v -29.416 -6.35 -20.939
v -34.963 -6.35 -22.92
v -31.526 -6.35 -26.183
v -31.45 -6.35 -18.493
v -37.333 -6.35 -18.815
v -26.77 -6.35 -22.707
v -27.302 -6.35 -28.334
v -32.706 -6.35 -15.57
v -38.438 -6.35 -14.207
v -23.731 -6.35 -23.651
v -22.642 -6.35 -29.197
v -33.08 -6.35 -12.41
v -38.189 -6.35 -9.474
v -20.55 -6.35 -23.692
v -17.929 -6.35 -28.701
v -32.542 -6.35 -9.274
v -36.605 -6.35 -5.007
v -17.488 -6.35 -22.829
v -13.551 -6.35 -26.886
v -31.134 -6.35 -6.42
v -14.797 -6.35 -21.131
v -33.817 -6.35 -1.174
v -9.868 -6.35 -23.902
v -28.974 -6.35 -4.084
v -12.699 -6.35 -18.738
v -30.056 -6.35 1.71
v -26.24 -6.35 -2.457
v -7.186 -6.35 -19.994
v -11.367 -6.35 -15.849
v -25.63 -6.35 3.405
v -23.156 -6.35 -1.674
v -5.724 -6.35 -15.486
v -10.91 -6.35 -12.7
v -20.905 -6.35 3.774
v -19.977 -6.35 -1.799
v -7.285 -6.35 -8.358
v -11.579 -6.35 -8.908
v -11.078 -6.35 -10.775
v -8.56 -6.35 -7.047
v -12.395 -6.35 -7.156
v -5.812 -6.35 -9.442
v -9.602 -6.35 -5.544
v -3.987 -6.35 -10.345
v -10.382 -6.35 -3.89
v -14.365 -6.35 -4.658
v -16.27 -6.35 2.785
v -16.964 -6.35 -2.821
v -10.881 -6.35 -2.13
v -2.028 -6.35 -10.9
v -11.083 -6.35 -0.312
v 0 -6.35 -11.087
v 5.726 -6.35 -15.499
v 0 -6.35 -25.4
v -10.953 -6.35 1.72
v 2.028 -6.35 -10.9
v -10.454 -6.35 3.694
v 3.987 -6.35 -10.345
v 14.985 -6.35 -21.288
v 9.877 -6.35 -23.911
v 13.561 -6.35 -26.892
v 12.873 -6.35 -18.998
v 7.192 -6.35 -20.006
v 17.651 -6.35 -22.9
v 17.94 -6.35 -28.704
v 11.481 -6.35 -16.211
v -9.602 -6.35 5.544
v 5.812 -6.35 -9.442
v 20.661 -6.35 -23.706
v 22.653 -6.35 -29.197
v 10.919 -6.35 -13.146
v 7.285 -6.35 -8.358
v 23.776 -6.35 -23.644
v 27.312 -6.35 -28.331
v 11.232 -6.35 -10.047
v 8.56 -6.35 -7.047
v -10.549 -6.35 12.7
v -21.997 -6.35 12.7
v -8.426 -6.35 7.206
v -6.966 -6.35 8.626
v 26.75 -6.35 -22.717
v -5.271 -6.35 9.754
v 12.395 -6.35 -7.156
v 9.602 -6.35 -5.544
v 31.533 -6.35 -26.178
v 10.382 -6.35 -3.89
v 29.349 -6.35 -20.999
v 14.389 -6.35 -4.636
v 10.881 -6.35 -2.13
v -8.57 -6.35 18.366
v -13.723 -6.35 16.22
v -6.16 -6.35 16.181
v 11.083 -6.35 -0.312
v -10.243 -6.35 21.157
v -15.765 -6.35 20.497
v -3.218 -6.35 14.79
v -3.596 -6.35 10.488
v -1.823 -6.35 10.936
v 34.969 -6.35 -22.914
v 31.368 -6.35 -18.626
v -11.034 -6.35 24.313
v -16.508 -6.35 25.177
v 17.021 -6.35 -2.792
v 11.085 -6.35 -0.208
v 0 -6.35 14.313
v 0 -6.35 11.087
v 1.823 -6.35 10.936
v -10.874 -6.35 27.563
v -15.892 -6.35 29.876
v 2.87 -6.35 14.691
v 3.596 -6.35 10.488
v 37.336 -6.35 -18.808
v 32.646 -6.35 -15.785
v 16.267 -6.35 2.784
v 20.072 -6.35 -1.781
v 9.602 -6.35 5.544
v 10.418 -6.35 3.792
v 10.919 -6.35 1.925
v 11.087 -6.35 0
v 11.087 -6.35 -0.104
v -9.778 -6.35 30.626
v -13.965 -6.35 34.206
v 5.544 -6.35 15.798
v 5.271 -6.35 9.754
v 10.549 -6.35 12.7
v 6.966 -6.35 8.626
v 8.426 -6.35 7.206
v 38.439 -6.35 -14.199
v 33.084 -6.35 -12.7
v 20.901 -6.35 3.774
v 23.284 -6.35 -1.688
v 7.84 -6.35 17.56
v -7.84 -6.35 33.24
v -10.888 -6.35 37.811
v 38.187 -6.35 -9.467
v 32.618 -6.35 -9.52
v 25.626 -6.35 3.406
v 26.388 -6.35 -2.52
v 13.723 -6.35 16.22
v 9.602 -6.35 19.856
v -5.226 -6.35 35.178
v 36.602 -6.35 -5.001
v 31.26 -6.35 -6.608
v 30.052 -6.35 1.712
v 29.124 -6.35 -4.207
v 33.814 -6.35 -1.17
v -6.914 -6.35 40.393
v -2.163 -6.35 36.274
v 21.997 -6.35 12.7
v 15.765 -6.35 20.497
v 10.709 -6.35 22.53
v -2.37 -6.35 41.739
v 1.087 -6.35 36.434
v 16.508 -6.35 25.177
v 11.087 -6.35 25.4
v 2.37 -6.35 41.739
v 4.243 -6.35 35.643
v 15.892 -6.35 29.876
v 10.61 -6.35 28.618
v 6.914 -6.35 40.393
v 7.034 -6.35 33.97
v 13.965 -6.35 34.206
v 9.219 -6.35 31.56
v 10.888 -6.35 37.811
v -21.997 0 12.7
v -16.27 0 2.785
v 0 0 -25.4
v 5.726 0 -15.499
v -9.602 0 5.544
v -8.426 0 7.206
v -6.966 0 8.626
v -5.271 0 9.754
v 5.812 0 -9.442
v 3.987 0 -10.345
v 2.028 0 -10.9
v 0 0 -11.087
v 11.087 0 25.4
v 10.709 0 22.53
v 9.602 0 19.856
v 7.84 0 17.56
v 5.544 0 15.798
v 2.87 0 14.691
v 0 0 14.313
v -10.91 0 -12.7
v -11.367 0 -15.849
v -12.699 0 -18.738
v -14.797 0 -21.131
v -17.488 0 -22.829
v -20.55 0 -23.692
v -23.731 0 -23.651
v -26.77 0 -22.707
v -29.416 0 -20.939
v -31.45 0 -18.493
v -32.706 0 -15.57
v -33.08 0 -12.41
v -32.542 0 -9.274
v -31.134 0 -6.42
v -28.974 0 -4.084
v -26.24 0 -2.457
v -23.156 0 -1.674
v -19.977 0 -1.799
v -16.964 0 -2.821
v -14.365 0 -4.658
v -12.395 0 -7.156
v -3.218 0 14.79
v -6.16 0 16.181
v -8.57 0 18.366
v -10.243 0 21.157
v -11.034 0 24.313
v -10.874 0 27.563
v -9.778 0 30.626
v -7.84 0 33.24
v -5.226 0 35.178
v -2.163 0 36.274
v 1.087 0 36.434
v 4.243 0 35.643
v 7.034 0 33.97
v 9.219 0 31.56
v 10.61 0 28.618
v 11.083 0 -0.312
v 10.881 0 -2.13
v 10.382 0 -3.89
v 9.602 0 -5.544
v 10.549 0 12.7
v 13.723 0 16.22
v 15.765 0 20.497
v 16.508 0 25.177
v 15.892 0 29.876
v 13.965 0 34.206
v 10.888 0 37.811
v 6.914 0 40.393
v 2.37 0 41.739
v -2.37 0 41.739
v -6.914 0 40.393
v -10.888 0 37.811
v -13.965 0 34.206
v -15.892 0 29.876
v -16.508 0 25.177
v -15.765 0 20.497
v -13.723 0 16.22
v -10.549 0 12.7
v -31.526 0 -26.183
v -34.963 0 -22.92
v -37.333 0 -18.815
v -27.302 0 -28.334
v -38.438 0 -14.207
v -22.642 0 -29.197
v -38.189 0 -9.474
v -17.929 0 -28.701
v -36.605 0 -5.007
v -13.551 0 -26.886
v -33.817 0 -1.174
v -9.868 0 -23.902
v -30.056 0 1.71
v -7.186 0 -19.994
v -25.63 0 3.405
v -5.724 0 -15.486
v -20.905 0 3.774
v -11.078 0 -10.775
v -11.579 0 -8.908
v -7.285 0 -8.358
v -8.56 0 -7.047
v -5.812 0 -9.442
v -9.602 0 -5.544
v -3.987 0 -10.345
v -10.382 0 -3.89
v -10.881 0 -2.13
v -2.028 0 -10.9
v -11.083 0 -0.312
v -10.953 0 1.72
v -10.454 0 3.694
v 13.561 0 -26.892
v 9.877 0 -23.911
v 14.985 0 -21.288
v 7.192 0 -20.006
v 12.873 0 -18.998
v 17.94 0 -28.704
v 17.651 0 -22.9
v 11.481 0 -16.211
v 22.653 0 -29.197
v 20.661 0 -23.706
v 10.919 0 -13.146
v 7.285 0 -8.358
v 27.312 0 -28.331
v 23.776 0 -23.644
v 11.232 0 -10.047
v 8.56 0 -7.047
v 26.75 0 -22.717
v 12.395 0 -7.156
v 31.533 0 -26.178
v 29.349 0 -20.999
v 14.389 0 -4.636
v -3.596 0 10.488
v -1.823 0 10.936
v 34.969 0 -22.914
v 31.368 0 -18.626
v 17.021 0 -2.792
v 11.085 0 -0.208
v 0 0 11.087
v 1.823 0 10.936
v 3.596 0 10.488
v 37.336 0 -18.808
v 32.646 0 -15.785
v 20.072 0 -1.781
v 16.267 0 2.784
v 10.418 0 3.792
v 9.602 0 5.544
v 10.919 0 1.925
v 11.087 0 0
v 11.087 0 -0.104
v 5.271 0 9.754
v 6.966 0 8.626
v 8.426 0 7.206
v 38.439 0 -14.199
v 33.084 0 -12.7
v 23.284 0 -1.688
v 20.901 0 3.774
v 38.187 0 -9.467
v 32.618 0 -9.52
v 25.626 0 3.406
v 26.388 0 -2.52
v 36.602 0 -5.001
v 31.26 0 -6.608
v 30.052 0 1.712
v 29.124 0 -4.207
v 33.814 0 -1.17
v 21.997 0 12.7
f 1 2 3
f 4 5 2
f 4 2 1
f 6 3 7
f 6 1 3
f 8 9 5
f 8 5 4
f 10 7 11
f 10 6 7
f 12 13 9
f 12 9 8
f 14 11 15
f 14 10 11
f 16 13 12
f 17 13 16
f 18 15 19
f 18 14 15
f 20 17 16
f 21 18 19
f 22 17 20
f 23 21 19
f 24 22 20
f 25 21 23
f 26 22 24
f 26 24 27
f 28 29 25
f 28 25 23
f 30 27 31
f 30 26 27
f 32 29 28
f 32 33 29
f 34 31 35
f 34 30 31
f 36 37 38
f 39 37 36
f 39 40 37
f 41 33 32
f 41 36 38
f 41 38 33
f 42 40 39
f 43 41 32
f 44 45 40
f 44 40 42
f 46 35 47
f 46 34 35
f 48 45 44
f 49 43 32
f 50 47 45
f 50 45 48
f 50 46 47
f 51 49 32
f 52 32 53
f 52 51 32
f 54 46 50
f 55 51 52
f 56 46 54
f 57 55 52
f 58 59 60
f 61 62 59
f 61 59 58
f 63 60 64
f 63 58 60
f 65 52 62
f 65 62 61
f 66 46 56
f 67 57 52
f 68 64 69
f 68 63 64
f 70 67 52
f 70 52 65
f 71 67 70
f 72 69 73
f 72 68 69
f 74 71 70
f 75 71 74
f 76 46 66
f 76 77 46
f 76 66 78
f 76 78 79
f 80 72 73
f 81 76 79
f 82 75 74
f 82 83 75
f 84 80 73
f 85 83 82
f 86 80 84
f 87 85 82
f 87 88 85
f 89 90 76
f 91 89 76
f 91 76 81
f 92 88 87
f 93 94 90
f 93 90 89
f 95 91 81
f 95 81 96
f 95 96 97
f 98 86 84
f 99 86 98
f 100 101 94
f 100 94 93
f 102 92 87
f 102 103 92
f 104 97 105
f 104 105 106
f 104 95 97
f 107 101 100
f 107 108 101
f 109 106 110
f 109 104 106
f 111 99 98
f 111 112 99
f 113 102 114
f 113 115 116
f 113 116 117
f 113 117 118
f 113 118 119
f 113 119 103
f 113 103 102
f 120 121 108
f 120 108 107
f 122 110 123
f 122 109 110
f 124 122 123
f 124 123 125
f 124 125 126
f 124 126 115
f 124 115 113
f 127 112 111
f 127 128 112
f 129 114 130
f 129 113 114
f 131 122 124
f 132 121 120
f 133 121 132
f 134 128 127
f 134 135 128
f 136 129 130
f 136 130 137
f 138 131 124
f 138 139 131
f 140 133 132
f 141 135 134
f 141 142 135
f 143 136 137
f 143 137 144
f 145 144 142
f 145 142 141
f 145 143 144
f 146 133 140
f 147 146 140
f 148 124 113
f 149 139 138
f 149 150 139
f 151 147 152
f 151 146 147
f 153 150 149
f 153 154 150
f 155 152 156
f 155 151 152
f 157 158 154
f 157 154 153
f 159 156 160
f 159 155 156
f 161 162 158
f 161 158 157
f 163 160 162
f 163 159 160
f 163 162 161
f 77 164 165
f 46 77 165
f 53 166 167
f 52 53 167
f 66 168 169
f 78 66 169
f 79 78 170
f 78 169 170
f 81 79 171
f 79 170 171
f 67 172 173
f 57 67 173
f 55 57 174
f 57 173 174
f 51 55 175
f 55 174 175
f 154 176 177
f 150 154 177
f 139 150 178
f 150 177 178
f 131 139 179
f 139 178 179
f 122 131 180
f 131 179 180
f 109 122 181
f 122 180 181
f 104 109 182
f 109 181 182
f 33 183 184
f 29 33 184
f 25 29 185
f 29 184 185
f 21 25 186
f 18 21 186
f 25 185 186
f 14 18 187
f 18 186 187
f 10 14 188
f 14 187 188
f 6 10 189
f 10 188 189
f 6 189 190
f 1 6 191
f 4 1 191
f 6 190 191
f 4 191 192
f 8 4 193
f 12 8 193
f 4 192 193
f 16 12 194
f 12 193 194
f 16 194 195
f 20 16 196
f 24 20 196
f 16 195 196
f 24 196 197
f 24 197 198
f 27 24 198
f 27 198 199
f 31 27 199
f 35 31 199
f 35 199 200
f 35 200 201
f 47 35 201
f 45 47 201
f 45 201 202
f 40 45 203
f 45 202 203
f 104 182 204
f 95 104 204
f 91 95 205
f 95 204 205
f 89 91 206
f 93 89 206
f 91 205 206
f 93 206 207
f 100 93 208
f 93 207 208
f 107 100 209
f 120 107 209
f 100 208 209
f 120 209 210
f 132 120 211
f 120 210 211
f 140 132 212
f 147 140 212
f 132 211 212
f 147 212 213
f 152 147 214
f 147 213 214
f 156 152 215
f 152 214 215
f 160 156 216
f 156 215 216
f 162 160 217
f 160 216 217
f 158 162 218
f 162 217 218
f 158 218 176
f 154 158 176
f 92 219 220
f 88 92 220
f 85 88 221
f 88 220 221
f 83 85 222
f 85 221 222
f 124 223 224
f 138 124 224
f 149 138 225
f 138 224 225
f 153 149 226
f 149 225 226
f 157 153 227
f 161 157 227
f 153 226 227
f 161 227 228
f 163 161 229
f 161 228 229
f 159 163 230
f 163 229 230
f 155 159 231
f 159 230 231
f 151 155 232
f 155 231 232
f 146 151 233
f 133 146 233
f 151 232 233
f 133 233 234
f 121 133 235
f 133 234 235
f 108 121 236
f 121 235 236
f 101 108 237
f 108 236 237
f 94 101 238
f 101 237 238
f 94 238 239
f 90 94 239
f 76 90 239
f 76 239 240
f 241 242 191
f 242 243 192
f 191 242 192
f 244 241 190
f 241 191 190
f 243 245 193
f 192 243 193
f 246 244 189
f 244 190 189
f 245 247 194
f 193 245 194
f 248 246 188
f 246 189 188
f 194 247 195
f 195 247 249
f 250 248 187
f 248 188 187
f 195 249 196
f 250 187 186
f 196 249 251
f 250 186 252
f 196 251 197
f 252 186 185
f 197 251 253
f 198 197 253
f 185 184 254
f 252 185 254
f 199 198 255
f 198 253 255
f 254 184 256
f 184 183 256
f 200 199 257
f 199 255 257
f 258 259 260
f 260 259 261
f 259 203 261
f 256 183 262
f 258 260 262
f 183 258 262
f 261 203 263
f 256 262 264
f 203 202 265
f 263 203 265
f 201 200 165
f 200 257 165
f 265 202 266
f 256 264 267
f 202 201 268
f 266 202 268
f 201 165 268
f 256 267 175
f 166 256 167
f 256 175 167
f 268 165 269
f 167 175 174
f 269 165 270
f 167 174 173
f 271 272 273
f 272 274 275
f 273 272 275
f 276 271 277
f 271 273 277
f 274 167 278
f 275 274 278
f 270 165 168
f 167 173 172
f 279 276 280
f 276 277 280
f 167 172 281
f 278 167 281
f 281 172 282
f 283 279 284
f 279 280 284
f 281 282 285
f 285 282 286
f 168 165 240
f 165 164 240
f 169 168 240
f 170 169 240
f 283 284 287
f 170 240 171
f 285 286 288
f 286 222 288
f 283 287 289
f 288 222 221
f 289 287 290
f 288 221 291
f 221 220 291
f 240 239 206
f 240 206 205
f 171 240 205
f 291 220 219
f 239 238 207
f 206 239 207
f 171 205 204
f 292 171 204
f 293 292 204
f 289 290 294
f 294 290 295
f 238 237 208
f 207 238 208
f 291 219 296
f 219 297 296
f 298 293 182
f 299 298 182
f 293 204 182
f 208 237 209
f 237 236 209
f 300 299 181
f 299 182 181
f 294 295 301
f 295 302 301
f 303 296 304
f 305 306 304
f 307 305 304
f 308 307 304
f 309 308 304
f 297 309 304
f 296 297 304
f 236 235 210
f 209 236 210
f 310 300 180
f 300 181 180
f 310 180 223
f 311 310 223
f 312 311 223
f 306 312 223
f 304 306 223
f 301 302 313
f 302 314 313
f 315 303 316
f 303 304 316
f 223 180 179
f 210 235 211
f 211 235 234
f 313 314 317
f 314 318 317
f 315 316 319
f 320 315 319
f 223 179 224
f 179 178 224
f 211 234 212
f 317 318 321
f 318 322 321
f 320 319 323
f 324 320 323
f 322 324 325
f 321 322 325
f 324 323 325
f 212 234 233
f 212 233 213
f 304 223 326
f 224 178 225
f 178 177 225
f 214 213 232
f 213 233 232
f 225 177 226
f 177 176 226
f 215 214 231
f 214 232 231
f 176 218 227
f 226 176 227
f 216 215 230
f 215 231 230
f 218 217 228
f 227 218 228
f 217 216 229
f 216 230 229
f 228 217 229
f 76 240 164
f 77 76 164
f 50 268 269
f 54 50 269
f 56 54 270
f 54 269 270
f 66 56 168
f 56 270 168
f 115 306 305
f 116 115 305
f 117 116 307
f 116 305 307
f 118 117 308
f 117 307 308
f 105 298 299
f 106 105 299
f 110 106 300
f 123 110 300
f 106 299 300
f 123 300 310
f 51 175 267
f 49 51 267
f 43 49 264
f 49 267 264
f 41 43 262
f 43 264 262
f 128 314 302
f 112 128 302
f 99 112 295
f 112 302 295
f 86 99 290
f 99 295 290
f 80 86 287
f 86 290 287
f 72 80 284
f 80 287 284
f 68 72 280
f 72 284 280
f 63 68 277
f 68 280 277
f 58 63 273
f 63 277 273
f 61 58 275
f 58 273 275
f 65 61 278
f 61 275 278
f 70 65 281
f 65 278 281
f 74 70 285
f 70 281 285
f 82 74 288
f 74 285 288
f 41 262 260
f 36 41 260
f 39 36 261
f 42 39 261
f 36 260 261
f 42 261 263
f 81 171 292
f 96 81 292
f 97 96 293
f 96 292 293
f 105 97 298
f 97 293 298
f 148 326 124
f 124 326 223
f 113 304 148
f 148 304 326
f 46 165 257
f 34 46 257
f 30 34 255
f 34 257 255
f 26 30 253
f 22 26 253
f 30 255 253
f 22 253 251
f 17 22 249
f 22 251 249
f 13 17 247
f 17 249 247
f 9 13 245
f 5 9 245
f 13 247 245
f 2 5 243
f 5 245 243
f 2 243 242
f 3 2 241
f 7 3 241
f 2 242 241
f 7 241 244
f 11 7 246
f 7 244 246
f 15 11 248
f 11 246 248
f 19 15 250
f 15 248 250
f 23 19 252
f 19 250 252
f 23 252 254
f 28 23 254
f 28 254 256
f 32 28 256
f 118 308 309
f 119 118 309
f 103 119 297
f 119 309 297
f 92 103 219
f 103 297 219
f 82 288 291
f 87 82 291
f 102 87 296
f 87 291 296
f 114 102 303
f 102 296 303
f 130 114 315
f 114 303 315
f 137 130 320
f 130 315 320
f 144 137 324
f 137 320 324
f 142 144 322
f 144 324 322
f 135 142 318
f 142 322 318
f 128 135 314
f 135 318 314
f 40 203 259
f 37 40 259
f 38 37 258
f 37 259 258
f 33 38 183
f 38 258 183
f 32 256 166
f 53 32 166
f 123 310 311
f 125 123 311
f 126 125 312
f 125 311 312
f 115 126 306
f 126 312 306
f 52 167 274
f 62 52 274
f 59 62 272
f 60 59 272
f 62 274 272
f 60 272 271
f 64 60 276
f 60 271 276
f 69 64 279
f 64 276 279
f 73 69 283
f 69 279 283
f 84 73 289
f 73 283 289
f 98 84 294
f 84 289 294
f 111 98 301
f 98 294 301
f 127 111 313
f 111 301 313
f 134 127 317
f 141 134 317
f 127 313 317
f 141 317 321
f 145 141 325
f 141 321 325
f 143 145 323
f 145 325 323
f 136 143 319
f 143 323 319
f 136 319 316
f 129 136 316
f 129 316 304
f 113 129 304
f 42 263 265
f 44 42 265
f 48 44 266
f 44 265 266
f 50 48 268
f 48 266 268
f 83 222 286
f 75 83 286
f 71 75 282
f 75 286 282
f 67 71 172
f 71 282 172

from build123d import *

# Parameters (mm, degrees)
F1_DEPTH = 6.35


with BuildPart() as f1:
    # F0 (on Front) → F1 (new body)
    with BuildSketch(Plane.XZ):
        with BuildLine():
            ThreePointArc((-5.723816, -15.486059), (-5.488792, -12.459869), (-5.811737, -9.441795))
            ThreePointArc((-5.811737, -9.441795), (-7.949382, -7.728591), (-9.60171, -5.54355))
            ThreePointArc((-9.60171, -5.54355), (-10.667847, -3.020071), (-11.082703, -0.312214))
            ThreePointArc((-11.082703, -0.312214), (-13.533332, 1.47553), (-16.269675, 2.784745))
            ThreePointArc((-16.269675, 2.784745), (-36.296072, -20.953359), (-5.723816, -15.486059))
        make_face()
        with BuildLine():
            ThreePointArc((-10.909945, -12.7), (-32.706361, -15.569553), (-12.395335, -7.15645))
            ThreePointArc((-12.395335, -7.15645), (-11.287729, -9.830447), (-10.909945, -12.7))
        make_face(mode=Mode.SUBTRACT)
        with BuildLine():
            ThreePointArc((16.267047, 2.783773), (13.532129, 1.474812), (11.082703, -0.312214))
            ThreePointArc((11.082703, -0.312214), (10.667847, -3.020071), (9.60171, -5.54355))
            ThreePointArc((9.60171, -5.54355), (7.949382, -7.728591), (5.811737, -9.441795))
            ThreePointArc((5.811737, -9.441795), (5.488694, -12.46668), (5.726121, -15.499486))
            ThreePointArc((5.726121, -15.499486), (36.300176, -20.946245), (16.267047, 2.783773))
        make_face()
        with BuildLine():
            ThreePointArc((33.084145, -12.7), (19.127493, -23.409316), (12.395335, -7.15645))
            ThreePointArc((12.395335, -7.15645), (24.866598, -1.990684), (33.084145, -12.7))
        make_face(mode=Mode.SUBTRACT)
        with BuildLine():
            ThreePointArc((0, 11.0871), (2.718465, 10.748662), (5.270966, 9.75401))
            ThreePointArc((5.270966, 9.75401), (8.046167, 10.983368), (10.549412, 12.7))
            ThreePointArc((10.549412, 12.7), (0, 41.91), (-10.549412, 12.7))
            ThreePointArc((-10.549412, 12.7), (-8.046167, 10.983368), (-5.270966, 9.75401))
            ThreePointArc((-5.270966, 9.75401), (-2.718465, 10.748662), (0, 11.0871))
        make_face()
        with BuildLine():
            ThreePointArc((11.0871, 25.4), (7.839764, 17.560236), (0, 14.3129))
            ThreePointArc((0, 14.3129), (-7.839764, 33.239764), (11.0871, 25.4))
        make_face(mode=Mode.SUBTRACT)
        with BuildLine():
            ThreePointArc((5.270966, 9.75401), (7.728591, 7.949382), (9.60171, 5.54355))
            Line((9.60171, 5.54355), (21.997045, 12.7))
            Line((21.997045, 12.7), (10.549412, 12.7))
            ThreePointArc((10.549412, 12.7), (8.046167, 10.983368), (5.270966, 9.75401))
        make_face()
        with BuildLine():
            ThreePointArc((9.60171, 5.54355), (10.709316, 2.869553), (11.0871, 0))
            ThreePointArc((11.0871, 0), (11.086001, -0.156123), (11.082703, -0.312214))
            ThreePointArc((11.082703, -0.312214), (13.532129, 1.474812), (16.267047, 2.783773))
            Line((16.267047, 2.783773), (21.997045, 12.7))
            Line((21.997045, 12.7), (9.60171, 5.54355))
        make_face()
        with BuildLine():
            ThreePointArc((5.726121, -15.499486), (5.488694, -12.46668), (5.811737, -9.441795))
            ThreePointArc((5.811737, -9.441795), (3.020071, -10.667847), (0, -11.0871))
            Line((0, -11.0871), (0, -25.4))
            Line((0, -25.4), (5.726121, -15.499486))
        make_face()
        with BuildLine():
            Line((0, -25.4), (0, -11.0871))
            ThreePointArc((0, -11.0871), (-3.020071, -10.667847), (-5.811737, -9.441795))
            ThreePointArc((-5.811737, -9.441795), (-5.488792, -12.459869), (-5.723816, -15.486059))
            Line((-5.723816, -15.486059), (0, -25.4))
        make_face()
        with BuildLine():
            ThreePointArc((-11.082703, -0.312214), (-10.748662, 2.718465), (-9.60171, 5.54355))
            Line((-9.60171, 5.54355), (-21.997045, 12.7))
            Line((-21.997045, 12.7), (-16.269675, 2.784745))
            ThreePointArc((-16.269675, 2.784745), (-13.533332, 1.47553), (-11.082703, -0.312214))
        make_face()
        with BuildLine():
            ThreePointArc((-9.60171, 5.54355), (-7.728591, 7.949382), (-5.270966, 9.75401))
            ThreePointArc((-5.270966, 9.75401), (-8.046167, 10.983368), (-10.549412, 12.7))
            Line((-10.549412, 12.7), (-21.997045, 12.7))
            Line((-21.997045, 12.7), (-9.60171, 5.54355))
        make_face()
    extrude(amount=F1_DEPTH)


solid = f1.part
